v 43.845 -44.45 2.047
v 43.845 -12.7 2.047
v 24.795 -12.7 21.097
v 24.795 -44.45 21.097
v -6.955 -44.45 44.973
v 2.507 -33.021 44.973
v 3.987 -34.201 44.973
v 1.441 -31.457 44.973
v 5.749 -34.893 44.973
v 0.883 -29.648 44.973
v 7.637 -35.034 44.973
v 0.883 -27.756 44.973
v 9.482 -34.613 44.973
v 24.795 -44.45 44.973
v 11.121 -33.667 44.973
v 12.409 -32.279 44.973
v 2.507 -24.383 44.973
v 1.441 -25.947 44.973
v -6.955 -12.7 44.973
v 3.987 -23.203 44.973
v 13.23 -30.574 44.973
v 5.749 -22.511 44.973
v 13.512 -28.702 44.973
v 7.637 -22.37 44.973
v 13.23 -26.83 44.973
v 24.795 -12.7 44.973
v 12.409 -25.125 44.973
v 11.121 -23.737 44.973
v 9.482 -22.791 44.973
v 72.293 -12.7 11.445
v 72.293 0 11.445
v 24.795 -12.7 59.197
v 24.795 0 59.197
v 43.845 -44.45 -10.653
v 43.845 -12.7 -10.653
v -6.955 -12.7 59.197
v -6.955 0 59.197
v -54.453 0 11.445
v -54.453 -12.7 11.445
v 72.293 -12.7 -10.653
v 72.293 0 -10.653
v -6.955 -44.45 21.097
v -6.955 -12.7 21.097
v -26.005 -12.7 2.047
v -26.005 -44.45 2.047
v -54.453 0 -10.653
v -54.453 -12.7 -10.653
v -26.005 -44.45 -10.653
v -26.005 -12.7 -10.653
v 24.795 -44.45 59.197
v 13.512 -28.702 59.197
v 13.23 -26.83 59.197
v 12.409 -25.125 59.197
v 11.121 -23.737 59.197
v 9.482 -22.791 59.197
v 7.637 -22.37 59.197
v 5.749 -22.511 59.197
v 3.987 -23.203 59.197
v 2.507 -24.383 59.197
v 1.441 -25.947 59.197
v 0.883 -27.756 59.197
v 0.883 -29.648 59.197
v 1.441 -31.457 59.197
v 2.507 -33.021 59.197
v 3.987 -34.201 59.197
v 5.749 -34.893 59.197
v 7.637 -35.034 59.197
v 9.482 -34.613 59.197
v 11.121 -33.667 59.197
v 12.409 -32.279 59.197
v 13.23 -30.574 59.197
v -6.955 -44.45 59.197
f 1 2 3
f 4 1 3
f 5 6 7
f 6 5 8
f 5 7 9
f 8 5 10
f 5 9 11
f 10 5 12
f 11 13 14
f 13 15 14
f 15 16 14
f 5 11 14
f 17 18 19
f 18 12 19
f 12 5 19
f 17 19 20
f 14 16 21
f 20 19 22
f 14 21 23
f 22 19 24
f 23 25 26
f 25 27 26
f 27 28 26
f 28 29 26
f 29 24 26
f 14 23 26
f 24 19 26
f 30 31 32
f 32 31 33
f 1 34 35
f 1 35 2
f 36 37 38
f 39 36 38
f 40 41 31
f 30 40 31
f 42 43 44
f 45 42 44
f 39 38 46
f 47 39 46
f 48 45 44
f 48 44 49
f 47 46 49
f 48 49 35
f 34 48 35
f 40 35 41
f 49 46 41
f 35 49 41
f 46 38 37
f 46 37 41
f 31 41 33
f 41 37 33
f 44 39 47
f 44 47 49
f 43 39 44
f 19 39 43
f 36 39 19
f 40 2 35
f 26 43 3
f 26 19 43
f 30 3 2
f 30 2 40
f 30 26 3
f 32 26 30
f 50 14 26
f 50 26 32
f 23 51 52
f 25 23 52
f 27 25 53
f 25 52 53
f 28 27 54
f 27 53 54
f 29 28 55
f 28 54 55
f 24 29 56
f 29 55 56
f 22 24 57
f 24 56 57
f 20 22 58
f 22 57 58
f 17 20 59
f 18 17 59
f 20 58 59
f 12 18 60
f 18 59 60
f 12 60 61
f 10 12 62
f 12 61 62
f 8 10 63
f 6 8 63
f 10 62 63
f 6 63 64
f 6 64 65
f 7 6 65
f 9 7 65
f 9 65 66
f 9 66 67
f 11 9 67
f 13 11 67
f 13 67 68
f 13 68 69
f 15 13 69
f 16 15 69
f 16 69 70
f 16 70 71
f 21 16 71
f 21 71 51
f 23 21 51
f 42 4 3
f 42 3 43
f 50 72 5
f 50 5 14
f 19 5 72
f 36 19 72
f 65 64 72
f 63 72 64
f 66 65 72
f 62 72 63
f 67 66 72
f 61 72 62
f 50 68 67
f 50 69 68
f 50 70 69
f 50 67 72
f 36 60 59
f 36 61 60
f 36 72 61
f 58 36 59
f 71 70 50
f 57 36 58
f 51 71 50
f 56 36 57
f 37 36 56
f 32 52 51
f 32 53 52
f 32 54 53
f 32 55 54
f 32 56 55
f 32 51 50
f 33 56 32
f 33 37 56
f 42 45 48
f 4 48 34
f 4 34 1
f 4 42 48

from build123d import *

# Parameters (mm, degrees)
F1_DEPTH = 12.7
F2_W     = 31.75
F2_H     = 14.224
F3_DEPTH = 31.75
F4_R     = 6.35
F5_DEPTH = 25.4


with BuildPart() as f1:
    # F0 (on Front) → F1 (new body)
    with BuildSketch(Plane.XZ):
        Polygon((24.795182, 59.197172), (-6.954818, 59.197172), (-54.452818, 11.445172), (-54.452818, -10.652828), (72.293182, -10.652828), (72.293182, 11.445172), align=None)
    extrude(amount=F1_DEPTH)

    # F2 (on face) → F3 (join)
    with BuildSketch(Plane.XZ.offset(12.7)):
        with Locations((8.920182, 52.085172)):
            Rectangle(F2_W, F2_H)
        Polygon((-26.004818, 2.047172), (-26.004818, -10.652828), (43.845182, -10.652828), (43.845182, 2.047172), (24.795182, 21.097172), (-6.954818, 21.097172), align=None)
    extrude(amount=F3_DEPTH)

    # F4 (on face) → F5 (cut)
    with BuildSketch(Plane.XY.offset(59.197172)):
        with Locations((7.162185, -28.702)):
            Circle(F4_R)
    extrude(amount=-F5_DEPTH, mode=Mode.SUBTRACT)


solid = f1.part
